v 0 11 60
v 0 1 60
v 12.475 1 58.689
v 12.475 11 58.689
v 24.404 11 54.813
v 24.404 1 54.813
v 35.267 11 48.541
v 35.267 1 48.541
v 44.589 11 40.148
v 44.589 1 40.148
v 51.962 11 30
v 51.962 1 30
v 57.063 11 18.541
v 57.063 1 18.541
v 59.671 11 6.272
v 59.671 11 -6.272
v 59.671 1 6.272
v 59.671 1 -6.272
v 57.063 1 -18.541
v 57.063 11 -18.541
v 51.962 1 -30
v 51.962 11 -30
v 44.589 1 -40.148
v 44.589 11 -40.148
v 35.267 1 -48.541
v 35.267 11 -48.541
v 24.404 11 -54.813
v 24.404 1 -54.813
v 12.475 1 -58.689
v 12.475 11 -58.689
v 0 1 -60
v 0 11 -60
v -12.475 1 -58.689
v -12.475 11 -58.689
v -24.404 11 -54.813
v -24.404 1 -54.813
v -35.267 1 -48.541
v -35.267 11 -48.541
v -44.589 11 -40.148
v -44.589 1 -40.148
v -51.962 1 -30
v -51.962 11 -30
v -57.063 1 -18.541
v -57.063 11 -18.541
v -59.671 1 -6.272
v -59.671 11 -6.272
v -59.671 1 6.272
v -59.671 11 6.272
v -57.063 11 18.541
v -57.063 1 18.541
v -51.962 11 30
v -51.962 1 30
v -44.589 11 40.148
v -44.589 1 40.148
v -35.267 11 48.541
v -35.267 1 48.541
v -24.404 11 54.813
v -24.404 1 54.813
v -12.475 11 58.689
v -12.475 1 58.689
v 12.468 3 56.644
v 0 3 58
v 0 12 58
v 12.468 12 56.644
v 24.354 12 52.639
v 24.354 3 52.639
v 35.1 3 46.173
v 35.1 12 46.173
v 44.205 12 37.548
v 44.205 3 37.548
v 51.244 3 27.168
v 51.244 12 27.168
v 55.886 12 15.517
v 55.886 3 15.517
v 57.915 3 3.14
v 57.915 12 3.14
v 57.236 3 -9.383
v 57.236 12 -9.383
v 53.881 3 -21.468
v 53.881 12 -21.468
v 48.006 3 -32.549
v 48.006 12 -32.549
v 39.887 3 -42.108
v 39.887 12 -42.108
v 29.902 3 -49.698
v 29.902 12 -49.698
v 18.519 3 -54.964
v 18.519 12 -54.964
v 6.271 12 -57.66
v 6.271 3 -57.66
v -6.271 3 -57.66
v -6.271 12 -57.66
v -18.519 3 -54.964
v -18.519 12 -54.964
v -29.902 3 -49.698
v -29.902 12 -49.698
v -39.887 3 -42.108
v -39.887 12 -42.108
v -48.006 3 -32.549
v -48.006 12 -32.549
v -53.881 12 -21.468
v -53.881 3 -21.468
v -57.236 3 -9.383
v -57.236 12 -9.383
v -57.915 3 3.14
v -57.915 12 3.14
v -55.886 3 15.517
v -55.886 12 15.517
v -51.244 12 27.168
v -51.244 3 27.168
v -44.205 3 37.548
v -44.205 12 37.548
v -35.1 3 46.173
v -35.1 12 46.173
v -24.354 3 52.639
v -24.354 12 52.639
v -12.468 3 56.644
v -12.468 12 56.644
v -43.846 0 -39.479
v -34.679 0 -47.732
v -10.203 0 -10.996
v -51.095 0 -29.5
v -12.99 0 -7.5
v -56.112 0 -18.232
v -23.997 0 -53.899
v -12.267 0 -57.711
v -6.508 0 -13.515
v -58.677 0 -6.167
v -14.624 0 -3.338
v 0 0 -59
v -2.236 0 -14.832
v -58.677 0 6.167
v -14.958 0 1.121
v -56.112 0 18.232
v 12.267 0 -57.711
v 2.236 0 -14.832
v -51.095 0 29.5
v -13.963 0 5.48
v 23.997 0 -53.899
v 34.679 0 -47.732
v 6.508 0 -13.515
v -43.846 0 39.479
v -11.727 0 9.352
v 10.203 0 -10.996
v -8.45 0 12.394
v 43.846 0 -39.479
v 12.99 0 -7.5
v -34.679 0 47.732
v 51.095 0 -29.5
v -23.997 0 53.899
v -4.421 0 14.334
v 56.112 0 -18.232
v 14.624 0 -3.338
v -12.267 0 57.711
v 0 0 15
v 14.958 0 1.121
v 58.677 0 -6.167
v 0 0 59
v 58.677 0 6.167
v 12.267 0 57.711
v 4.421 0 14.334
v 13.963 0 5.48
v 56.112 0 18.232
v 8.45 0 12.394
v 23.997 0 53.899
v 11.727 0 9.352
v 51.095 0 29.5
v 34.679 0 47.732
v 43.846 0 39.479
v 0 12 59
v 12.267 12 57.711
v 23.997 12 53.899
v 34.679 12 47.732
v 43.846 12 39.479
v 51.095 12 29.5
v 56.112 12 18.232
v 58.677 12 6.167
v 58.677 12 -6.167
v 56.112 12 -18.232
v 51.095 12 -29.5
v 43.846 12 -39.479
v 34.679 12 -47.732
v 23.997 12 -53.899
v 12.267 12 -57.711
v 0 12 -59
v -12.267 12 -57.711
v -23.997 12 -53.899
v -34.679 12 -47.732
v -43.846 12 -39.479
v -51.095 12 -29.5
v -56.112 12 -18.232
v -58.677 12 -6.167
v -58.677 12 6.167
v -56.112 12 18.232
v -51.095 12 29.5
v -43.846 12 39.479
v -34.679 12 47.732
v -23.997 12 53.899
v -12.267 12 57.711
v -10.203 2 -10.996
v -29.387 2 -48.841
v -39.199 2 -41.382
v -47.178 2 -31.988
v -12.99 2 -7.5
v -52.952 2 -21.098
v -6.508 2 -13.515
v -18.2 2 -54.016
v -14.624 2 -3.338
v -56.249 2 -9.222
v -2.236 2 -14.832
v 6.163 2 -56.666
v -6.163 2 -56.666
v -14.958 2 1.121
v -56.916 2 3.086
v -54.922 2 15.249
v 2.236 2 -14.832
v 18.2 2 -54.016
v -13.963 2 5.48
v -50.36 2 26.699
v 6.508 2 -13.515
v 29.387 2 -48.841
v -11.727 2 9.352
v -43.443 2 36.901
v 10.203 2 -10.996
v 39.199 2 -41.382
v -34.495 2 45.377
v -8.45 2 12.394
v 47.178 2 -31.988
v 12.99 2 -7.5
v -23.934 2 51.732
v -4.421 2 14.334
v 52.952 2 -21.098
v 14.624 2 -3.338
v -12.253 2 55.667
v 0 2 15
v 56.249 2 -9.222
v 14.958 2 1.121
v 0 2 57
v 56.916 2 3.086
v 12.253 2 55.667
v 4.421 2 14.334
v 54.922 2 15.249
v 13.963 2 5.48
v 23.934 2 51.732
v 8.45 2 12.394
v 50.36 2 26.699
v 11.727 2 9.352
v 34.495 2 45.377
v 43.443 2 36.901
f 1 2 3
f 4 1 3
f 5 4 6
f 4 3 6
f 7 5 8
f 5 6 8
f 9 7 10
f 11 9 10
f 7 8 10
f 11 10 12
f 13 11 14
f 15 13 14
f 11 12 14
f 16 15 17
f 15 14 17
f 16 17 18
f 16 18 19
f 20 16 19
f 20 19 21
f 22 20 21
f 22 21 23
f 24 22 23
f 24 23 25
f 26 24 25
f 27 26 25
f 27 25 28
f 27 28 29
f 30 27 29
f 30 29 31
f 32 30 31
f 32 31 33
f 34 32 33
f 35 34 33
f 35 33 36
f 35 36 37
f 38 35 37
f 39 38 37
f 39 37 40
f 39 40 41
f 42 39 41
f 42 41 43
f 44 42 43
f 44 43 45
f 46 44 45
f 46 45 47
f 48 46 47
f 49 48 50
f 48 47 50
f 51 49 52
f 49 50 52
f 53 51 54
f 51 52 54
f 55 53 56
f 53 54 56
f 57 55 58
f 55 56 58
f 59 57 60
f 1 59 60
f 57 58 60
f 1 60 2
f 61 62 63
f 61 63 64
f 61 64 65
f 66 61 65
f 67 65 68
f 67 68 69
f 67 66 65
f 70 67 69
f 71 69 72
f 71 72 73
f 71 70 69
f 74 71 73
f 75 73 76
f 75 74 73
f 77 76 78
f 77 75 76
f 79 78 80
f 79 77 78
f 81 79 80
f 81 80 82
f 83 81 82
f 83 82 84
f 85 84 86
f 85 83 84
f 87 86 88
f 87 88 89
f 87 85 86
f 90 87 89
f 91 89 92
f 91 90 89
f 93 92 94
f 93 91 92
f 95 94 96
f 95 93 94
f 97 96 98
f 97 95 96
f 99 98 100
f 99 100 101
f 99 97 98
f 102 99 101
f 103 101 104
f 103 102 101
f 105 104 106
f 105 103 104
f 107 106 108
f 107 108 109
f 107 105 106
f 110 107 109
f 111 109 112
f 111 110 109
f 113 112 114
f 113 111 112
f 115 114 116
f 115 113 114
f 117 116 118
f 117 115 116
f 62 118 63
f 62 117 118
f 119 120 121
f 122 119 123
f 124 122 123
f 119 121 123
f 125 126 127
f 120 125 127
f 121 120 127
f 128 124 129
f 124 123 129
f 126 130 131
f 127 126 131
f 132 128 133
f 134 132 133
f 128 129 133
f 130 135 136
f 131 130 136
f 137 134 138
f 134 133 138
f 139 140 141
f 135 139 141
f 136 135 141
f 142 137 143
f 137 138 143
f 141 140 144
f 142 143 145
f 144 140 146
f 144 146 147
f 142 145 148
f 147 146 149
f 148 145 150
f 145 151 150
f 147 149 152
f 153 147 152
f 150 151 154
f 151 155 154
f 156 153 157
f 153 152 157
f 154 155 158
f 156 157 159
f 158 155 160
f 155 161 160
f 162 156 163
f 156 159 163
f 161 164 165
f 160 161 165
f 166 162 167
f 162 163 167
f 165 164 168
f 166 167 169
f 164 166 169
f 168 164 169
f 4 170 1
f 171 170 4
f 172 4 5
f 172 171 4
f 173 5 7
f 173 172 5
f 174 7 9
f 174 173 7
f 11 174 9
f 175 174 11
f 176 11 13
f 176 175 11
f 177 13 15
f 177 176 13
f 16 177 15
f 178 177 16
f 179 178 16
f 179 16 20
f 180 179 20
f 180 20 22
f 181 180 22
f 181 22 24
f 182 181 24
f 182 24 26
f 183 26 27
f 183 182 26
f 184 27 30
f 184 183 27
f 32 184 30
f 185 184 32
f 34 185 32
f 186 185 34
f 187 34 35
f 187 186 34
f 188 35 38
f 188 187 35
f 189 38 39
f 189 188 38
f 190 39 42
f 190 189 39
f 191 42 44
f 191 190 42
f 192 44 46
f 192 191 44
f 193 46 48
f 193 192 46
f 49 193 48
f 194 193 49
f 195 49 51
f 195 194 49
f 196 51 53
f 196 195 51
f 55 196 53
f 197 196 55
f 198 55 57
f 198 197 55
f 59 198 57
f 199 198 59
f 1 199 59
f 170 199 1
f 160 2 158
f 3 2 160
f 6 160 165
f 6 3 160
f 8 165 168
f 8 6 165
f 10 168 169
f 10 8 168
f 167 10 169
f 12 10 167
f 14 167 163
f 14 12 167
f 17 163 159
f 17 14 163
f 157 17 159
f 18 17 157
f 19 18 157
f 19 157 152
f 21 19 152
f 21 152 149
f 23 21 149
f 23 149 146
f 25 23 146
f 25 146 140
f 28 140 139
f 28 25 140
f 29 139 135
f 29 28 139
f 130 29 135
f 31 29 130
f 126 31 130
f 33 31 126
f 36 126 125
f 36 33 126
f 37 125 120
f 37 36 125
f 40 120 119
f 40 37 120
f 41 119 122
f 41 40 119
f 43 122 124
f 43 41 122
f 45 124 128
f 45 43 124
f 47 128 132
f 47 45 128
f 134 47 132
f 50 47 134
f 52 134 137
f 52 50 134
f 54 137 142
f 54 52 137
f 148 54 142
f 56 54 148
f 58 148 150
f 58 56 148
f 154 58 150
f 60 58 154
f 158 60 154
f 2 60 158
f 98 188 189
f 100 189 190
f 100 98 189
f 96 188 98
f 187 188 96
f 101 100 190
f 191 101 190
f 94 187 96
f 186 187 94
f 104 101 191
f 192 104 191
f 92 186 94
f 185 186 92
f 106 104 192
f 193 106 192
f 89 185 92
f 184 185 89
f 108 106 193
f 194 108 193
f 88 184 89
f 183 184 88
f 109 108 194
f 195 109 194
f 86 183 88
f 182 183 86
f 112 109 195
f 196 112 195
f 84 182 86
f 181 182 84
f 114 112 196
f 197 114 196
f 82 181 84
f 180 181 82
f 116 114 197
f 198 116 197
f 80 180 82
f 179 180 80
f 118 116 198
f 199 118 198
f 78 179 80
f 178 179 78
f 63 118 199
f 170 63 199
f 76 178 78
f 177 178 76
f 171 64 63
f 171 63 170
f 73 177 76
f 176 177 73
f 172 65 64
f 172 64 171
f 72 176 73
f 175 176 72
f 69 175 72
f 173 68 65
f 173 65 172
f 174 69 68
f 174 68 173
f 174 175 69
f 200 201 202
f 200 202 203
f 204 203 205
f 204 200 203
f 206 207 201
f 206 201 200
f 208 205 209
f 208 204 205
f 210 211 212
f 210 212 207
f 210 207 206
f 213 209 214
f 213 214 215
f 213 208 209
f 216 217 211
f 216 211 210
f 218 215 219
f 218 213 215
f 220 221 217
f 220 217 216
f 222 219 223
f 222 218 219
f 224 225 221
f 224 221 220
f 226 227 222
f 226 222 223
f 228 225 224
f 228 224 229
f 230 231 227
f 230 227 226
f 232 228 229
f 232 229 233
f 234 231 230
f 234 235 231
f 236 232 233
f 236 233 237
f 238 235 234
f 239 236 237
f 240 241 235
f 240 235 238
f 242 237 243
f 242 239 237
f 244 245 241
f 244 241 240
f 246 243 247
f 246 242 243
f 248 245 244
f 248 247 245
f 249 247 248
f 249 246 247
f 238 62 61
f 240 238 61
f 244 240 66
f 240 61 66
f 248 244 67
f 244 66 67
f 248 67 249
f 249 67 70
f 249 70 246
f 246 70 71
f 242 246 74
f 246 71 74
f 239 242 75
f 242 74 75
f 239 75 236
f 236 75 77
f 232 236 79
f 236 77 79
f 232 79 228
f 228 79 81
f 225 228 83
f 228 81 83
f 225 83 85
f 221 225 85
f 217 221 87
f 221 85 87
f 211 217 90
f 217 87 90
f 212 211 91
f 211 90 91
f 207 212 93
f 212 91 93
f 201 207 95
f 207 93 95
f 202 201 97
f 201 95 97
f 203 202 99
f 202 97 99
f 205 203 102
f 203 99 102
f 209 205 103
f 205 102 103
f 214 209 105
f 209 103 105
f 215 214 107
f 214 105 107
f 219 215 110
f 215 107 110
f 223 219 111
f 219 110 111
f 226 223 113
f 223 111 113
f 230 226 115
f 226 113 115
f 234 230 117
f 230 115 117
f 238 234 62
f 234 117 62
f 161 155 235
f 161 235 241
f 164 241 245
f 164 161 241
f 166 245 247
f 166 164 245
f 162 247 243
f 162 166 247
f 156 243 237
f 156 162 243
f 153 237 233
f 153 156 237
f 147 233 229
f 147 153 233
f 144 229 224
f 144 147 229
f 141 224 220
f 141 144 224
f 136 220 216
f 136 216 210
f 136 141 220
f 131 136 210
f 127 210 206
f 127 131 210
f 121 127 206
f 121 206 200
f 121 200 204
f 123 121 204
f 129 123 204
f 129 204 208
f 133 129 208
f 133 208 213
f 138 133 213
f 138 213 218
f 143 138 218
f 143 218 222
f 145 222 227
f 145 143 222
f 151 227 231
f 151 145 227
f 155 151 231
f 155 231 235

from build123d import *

# Parameters (mm, degrees)
SKICA1_R                = 60
SKICA1_R_2              = 15
P_IDAT_VYSUNUT_M1_DEPTH = 2
SKICA2_R                = 60
SKICA2_R_2              = 58
P_IDAT_VYSUNUT_M2_DEPTH = 10
ZKOSEN_1_SIZE           = 1
ZKOSEN_2_SIZE           = 1
ZKOSEN_3_SIZE           = 1


with BuildPart() as part:
    # Skica1 → Přidat vysunutím1 (new body)
    with BuildSketch(Plane(origin=(0, 0, 0), x_dir=(1, 0, 0), z_dir=(0, 1, 0))):
        with Locations(Location((0, 0, 0), (0, 0, 270))):
            Circle(SKICA1_R)
        with Locations(Location((0, 0, 0), (0, 0, 270))):
            Circle(SKICA1_R_2, mode=Mode.SUBTRACT)
    extrude(amount=P_IDAT_VYSUNUT_M1_DEPTH)

    # Skica2 → Přidat vysunutím2 (add)
    with BuildSketch(Plane(origin=(0, 2, 0), x_dir=(1, 0, 0), z_dir=(0, 1, 0))):
        with Locations(Location((0, 0, 0), (0, 0, 270))):
            Circle(SKICA2_R)
        with Locations(Location((0, 0, 0), (0, 0, 270))):
            Circle(SKICA2_R_2, mode=Mode.SUBTRACT)
    extrude(amount=P_IDAT_VYSUNUT_M2_DEPTH)

    # Zkosení1
    zkosen_1_edges = [part.edges().sort_by_distance(p)[0] for p in [
        (0, 2, -58),
    ]]
    chamfer(zkosen_1_edges, length=ZKOSEN_1_SIZE)

    # Zkosení2
    zkosen_2_edges = [part.edges().sort_by_distance(p)[0] for p in [
        (0, 0, -60),
    ]]
    chamfer(zkosen_2_edges, length=ZKOSEN_2_SIZE)

    # Zkosení3
    zkosen_3_edges = [part.edges().sort_by_distance(p)[0] for p in [
        (0, 12, -60),
    ]]
    chamfer(zkosen_3_edges, length=ZKOSEN_3_SIZE)


solid = part.part
